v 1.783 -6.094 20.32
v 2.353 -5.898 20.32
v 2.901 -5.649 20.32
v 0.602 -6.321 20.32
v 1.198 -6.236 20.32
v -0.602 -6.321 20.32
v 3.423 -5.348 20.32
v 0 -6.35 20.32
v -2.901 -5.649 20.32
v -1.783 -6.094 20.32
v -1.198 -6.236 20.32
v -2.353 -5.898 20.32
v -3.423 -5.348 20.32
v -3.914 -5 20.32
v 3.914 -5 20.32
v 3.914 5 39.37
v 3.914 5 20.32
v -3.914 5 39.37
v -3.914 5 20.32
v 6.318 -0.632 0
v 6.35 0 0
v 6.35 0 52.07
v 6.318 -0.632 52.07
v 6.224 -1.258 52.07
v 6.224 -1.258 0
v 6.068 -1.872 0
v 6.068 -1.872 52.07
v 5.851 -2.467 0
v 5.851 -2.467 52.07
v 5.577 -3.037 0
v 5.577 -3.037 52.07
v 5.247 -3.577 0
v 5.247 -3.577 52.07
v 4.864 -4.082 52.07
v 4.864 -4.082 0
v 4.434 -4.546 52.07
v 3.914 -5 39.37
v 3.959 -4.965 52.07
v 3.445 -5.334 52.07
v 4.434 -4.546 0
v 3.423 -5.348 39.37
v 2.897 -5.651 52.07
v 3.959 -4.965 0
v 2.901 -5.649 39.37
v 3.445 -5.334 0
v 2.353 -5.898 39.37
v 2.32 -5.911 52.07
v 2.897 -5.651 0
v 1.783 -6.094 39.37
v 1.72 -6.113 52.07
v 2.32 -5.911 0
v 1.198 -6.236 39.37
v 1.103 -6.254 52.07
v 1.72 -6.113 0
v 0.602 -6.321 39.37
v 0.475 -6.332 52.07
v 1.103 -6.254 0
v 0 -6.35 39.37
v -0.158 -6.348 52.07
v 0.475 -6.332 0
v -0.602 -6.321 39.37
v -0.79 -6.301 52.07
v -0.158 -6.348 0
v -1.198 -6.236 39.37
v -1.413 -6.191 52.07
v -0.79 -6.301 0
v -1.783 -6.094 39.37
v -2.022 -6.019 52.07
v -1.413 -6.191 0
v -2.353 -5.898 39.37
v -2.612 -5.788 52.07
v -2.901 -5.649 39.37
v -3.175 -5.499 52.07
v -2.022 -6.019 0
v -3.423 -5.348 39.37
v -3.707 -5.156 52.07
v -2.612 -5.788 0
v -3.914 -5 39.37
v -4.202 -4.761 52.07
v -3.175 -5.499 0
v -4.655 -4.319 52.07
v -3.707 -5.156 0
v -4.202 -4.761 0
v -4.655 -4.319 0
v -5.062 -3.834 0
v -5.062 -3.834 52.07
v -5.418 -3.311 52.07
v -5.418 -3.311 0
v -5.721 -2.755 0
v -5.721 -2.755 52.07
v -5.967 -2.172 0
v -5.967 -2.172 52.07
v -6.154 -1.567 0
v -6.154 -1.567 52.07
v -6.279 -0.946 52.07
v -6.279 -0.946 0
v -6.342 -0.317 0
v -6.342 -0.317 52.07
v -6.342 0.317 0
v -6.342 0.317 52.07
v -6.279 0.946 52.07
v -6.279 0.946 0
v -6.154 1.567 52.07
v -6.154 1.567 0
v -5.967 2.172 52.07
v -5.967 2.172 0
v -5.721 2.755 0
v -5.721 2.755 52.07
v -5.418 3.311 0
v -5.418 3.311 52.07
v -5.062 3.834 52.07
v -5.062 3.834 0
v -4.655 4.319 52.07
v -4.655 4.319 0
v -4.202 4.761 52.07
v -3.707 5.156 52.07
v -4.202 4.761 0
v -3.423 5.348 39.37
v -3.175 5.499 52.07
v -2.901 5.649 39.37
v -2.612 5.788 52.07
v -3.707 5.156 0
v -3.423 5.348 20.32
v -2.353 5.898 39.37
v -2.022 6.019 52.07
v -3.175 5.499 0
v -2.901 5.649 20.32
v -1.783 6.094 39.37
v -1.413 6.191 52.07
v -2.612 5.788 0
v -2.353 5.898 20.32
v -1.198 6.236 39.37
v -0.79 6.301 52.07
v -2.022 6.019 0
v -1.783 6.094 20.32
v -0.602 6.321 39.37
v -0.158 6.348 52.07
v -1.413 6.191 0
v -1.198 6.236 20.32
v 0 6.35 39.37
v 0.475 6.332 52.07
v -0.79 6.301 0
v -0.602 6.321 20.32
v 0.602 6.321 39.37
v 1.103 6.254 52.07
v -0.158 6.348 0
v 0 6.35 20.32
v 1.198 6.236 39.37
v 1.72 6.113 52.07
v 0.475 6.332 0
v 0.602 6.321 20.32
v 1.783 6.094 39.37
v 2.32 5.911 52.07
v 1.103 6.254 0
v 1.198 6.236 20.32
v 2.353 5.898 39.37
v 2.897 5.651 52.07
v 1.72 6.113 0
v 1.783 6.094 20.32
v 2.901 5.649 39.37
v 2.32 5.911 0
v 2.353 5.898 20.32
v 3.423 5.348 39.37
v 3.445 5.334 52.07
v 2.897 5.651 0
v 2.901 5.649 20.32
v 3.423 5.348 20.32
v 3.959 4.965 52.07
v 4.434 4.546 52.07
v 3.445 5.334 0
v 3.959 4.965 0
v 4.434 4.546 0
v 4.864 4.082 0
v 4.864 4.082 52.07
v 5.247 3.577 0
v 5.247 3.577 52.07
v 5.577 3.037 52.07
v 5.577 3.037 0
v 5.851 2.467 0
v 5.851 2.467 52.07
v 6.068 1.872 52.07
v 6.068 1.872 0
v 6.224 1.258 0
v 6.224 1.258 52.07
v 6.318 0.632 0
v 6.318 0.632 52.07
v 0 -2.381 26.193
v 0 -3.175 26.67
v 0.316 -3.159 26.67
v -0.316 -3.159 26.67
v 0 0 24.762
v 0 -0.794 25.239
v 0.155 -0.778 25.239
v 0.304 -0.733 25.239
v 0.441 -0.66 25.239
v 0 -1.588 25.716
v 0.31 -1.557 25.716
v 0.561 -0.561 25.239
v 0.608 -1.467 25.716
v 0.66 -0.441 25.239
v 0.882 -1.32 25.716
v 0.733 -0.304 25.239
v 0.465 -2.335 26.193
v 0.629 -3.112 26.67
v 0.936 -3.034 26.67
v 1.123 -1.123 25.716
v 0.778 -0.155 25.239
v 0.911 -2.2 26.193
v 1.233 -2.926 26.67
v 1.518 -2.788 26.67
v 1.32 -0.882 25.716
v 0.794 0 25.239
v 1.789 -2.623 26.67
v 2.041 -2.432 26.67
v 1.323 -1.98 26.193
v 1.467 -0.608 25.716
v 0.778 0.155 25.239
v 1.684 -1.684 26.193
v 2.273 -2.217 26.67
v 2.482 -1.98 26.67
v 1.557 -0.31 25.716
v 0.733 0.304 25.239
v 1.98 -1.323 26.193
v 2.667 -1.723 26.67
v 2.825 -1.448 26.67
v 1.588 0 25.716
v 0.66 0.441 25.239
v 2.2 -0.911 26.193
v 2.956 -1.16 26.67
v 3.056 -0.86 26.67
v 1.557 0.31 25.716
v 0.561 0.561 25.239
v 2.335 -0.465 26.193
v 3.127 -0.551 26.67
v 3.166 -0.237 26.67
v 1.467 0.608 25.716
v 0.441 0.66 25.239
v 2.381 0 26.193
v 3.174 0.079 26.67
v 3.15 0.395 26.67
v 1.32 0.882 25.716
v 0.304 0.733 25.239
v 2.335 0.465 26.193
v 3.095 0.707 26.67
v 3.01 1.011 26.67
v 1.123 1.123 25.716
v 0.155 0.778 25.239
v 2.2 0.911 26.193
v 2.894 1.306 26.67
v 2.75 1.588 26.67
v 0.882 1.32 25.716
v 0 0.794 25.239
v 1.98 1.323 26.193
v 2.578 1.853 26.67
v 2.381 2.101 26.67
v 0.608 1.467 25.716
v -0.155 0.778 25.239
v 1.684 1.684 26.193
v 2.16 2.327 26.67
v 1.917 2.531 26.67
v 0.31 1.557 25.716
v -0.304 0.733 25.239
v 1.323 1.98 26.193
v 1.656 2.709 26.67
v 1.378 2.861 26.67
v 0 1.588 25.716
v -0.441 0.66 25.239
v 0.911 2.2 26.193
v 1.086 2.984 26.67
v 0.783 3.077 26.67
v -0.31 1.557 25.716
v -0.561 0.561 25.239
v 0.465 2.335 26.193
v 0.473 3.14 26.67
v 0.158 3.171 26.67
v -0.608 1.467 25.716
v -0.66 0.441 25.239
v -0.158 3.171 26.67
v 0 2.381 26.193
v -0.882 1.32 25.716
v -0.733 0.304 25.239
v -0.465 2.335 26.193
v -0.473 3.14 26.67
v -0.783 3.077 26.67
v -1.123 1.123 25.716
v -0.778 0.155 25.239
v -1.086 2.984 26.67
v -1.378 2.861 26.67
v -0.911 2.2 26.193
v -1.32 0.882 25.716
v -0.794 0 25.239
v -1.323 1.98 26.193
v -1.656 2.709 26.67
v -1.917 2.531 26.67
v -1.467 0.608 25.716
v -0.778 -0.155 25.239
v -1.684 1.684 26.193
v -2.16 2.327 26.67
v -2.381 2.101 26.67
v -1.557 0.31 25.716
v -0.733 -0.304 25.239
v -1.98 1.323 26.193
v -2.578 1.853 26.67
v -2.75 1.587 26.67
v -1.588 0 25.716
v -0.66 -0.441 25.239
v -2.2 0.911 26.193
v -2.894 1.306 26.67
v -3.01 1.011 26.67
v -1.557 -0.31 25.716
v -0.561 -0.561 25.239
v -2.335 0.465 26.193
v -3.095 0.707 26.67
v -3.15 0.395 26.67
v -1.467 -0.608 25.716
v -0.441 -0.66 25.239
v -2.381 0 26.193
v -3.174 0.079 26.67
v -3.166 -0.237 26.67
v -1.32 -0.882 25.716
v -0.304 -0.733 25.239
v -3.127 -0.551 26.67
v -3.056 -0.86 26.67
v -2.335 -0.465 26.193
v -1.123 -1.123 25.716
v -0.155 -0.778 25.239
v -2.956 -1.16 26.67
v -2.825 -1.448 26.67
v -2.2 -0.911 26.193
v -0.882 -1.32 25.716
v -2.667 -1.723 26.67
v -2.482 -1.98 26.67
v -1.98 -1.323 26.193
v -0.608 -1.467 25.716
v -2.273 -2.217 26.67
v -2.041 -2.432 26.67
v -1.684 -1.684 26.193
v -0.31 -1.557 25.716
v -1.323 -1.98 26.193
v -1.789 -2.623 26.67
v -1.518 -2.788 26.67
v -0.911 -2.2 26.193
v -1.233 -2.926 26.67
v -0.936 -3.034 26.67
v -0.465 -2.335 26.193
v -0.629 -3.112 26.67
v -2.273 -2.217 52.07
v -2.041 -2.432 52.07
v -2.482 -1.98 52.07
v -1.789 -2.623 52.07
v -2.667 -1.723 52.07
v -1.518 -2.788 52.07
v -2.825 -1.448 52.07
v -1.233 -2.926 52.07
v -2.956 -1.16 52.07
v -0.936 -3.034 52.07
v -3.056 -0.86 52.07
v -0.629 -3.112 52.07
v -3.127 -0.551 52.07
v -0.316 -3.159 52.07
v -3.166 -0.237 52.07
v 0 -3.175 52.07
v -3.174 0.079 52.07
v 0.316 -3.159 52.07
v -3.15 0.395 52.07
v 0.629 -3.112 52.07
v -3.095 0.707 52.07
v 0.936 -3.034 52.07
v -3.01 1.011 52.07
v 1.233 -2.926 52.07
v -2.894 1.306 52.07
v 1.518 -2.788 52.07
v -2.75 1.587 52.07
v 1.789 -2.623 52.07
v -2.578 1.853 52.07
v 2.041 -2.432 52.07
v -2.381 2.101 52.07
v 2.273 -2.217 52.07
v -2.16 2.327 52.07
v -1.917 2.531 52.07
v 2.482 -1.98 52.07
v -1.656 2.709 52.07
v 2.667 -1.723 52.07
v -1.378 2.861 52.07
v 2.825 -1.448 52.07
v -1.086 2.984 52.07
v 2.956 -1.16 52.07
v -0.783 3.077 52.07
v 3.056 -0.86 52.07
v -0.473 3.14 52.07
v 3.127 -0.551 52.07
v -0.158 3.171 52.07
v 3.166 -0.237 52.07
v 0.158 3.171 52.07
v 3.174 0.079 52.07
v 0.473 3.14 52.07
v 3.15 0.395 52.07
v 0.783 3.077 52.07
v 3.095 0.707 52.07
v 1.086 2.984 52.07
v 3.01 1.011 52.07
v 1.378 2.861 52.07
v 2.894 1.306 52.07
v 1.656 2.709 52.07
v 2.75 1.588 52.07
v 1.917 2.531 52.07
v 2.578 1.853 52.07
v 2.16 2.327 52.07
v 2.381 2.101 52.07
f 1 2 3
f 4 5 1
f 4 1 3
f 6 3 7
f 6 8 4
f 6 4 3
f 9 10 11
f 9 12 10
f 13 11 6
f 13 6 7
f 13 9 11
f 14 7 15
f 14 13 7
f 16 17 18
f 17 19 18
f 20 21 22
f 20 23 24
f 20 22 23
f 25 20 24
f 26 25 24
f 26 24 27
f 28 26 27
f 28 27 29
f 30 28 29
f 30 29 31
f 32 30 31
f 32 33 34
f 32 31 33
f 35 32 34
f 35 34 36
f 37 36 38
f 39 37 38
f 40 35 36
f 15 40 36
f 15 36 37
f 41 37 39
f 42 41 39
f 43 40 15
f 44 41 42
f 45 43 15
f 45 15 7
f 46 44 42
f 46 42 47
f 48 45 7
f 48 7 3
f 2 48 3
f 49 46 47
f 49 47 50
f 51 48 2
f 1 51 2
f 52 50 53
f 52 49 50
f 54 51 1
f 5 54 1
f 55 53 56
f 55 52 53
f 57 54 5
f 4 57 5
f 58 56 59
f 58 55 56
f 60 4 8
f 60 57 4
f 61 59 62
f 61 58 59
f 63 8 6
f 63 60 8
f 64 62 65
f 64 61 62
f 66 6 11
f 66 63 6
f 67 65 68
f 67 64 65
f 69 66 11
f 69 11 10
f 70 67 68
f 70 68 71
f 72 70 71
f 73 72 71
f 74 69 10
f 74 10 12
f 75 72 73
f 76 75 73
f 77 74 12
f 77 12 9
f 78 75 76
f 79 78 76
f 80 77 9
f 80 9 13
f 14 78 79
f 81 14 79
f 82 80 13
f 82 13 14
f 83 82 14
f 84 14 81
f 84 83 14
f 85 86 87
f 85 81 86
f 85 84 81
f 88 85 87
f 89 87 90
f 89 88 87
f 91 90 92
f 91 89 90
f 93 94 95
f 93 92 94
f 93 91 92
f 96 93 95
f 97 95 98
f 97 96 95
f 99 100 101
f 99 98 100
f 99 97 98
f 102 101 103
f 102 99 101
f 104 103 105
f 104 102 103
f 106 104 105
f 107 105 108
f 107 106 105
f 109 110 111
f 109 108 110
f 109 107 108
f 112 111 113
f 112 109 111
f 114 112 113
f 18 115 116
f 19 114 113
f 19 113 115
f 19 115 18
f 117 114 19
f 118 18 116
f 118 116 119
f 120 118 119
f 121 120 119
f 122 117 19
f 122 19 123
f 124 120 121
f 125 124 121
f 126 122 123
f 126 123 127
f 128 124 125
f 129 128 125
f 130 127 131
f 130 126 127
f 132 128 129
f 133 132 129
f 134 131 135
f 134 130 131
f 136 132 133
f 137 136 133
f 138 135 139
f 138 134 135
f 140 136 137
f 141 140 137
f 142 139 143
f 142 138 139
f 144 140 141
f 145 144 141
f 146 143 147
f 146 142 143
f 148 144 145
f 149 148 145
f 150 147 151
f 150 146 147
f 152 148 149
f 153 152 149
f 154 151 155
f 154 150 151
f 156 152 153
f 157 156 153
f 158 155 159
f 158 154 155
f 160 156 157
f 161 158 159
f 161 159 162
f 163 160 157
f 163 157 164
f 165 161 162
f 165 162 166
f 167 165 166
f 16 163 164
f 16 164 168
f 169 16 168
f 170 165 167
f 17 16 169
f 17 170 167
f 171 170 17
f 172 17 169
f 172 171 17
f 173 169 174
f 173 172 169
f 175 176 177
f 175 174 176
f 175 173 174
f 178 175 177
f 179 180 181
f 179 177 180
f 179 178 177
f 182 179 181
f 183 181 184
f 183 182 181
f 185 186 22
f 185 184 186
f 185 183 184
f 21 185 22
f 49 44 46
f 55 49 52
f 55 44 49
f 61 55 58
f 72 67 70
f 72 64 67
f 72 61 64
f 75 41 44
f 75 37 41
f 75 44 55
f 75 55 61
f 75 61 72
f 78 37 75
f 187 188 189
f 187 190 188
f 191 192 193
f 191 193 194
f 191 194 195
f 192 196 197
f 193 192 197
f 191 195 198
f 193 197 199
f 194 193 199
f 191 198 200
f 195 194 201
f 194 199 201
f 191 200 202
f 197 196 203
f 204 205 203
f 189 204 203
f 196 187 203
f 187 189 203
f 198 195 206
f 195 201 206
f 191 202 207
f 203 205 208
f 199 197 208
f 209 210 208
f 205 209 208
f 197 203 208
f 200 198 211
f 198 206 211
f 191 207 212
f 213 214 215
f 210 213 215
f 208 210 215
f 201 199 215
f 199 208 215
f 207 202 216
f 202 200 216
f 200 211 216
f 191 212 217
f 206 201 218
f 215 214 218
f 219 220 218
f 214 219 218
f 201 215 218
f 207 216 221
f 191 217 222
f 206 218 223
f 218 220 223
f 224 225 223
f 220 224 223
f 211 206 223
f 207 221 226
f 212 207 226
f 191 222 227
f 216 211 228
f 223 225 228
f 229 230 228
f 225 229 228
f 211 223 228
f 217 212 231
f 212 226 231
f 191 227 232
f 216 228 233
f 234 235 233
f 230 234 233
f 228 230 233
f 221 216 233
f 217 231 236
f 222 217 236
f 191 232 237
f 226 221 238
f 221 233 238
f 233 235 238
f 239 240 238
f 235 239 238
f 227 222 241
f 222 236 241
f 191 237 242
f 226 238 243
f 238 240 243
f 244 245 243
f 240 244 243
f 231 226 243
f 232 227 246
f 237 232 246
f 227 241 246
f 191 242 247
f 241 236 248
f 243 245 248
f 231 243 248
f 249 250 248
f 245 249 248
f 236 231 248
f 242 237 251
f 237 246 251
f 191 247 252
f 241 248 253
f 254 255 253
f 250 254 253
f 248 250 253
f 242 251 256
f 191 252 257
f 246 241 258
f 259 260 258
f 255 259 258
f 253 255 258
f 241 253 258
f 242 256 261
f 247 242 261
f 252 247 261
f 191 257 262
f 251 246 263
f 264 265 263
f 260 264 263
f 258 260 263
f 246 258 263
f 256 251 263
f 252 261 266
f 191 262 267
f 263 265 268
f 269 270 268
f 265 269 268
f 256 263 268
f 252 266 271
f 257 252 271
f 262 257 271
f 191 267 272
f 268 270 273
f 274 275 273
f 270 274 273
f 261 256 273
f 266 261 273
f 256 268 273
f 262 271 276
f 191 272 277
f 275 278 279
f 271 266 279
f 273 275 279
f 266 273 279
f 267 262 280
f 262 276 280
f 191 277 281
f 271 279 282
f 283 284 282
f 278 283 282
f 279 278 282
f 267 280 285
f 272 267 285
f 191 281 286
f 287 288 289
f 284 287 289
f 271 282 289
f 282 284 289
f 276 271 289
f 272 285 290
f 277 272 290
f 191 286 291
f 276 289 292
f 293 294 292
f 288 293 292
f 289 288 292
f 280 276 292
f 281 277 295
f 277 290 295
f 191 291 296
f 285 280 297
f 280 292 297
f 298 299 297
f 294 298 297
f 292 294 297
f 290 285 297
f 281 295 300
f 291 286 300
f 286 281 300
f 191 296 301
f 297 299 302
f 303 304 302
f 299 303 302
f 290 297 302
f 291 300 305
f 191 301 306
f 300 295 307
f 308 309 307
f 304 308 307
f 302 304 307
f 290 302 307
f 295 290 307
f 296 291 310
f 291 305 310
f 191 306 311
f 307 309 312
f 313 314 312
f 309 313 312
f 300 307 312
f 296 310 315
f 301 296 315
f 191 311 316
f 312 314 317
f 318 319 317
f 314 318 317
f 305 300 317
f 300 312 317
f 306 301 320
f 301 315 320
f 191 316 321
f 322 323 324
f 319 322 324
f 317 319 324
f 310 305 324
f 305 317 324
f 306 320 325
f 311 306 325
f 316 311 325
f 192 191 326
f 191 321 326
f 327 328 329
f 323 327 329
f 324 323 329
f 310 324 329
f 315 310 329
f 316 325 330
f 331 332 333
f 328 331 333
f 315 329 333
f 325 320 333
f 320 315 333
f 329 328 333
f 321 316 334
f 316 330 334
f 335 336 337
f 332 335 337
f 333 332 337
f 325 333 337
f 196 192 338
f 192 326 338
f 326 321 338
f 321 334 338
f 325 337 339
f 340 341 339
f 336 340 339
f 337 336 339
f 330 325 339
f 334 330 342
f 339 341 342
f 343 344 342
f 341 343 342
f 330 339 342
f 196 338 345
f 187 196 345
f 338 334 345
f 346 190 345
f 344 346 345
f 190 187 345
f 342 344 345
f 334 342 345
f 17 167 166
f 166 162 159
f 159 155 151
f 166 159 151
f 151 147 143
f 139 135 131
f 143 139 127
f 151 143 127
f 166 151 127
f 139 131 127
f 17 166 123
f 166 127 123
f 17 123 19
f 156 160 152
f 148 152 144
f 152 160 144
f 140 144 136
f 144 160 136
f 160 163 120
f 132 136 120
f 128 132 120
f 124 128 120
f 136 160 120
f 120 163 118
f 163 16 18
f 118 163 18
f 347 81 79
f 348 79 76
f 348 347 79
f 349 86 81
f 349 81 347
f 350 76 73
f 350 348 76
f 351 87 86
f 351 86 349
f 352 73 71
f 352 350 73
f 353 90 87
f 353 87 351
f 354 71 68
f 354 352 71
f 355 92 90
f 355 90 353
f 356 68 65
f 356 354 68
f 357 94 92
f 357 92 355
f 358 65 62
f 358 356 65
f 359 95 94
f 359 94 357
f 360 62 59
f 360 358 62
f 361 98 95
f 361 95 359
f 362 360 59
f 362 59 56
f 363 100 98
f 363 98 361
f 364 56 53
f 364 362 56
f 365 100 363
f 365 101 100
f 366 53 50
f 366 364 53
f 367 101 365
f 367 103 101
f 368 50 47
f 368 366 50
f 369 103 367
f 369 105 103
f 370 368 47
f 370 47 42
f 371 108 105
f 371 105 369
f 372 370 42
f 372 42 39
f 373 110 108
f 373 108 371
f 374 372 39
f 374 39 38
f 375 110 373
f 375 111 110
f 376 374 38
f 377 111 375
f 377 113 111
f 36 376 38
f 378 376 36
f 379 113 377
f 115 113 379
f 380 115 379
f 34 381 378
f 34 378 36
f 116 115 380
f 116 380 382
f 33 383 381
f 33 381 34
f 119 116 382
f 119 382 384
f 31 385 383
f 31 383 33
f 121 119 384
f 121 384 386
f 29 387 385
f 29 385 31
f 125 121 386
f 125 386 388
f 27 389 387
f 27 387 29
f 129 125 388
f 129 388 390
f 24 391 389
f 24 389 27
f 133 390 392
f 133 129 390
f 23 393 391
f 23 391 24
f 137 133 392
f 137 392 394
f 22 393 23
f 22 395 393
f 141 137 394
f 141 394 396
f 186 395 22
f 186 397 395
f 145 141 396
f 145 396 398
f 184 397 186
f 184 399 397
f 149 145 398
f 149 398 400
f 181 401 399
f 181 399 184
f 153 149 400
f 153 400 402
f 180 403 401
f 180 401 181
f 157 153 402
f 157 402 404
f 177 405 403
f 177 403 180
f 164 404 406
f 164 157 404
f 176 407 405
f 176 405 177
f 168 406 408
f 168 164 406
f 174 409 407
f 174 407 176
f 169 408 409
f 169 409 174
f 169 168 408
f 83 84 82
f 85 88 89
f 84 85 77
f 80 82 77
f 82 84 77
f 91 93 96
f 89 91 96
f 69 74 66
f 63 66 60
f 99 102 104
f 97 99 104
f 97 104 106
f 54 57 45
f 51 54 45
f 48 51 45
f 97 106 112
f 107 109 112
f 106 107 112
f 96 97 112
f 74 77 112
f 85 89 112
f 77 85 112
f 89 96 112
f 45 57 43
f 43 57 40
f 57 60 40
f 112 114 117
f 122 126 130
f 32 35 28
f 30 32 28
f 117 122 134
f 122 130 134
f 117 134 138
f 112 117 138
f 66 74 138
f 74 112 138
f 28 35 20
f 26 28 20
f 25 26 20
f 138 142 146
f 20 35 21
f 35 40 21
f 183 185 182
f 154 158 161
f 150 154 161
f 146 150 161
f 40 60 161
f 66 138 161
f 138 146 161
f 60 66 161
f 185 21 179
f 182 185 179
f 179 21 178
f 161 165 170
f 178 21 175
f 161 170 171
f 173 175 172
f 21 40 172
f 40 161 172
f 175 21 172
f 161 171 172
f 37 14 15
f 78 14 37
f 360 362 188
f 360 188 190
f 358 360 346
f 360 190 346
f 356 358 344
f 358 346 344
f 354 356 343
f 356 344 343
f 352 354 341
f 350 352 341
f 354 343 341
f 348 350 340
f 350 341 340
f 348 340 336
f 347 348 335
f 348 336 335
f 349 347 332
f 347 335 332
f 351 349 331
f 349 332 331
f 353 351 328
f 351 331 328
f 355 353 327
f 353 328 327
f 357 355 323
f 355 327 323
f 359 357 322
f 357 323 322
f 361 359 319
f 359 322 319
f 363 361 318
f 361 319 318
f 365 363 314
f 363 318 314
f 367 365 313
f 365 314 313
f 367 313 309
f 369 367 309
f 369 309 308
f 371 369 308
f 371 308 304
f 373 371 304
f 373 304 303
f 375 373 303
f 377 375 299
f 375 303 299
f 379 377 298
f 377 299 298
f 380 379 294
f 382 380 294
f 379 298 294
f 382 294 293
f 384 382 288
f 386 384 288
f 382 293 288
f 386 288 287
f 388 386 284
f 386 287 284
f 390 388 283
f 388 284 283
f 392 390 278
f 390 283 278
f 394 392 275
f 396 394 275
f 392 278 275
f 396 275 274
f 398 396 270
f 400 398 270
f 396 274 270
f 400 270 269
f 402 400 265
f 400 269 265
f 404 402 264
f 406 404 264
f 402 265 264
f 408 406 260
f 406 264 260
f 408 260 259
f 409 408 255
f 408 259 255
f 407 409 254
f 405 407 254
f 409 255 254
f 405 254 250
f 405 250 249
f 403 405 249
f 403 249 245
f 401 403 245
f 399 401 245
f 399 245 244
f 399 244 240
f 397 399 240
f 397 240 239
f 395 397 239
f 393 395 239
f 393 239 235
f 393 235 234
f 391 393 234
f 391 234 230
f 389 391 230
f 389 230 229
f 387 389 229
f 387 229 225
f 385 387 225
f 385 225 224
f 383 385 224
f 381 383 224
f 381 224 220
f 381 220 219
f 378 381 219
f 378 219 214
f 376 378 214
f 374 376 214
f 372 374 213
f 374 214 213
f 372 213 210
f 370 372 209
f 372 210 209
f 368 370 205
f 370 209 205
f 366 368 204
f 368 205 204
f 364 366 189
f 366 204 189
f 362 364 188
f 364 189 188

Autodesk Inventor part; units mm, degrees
ref_plane "XZ Plane" through (0, 0, 0) normal (0, 1, 0) x (-1, 0, 0)
ref_plane "XY Plane" through (0, 0, 0) normal (0, 0, 1) x (1, 0, 0)
sketch "Sketch1" plane through (0, 0, 0) normal (0, 0, 1) x (1, 0, 0)
  circle A0 centre (0, 0) radius 6.35
  dimension "d0" = 12.7
extrude "Extrusion1" add sketch "Sketch1" along normal blind 52.07
ref_plane "Work Plane1" through (-6.35, 0, 0) normal (1, 0, 0) x (0, 1, 0)
sketch "Sketch2" plane through (-6.35, 0, 0) normal (1, 0, 0) x (0, 1, 0)
  line L0 (-6.35, 0) -> (6.35, 0) projected
  line L1 (6.35, 52.07) -> (-6.35, 52.07) projected
  line L2 (6.35, 0) -> (6.35, 52.07) projected
  line L3 (-6.35, 0) -> (-6.35, 52.07) projected
  line L4 (6.35, 20.32) -> (5, 20.32)
  line L5 (5, 20.32) -> (5, 39.37)
  line L6 (5, 39.37) -> (6.35, 39.37)
  line L7 (6.35, 39.37) -> (6.35, 20.32)
  line L8 (-6.35, 20.32) -> (-5, 20.32)
  line L9 (-5, 20.32) -> (-5, 39.37)
  line L10 (-5, 39.37) -> (-6.35, 39.37)
  line L11 (-6.35, 39.37) -> (-6.35, 20.32)
  point P0 (0, 0)
  dimension "d3" = 19.05
  dimension "d4" = 12.7
  dimension "d5" = 10
extrude "Extrusion2" cut sketch "Sketch2" along normal mid plane 52.07 contours L3 L10 L9 L8 | L4 L5 L6 L2
sketch "Sketch3" plane through (0, 0, 52.07) normal (0, 0, 1) x (1, 0, 0)
  point P0 (0, 0)
  point P1 (0, 0)
hole "Hole1" at (0, 0, 52.07) direction (0, 0, -1) diameter 6.35 depth 25.4 tip angle 118
properties part number "Pin V2"
